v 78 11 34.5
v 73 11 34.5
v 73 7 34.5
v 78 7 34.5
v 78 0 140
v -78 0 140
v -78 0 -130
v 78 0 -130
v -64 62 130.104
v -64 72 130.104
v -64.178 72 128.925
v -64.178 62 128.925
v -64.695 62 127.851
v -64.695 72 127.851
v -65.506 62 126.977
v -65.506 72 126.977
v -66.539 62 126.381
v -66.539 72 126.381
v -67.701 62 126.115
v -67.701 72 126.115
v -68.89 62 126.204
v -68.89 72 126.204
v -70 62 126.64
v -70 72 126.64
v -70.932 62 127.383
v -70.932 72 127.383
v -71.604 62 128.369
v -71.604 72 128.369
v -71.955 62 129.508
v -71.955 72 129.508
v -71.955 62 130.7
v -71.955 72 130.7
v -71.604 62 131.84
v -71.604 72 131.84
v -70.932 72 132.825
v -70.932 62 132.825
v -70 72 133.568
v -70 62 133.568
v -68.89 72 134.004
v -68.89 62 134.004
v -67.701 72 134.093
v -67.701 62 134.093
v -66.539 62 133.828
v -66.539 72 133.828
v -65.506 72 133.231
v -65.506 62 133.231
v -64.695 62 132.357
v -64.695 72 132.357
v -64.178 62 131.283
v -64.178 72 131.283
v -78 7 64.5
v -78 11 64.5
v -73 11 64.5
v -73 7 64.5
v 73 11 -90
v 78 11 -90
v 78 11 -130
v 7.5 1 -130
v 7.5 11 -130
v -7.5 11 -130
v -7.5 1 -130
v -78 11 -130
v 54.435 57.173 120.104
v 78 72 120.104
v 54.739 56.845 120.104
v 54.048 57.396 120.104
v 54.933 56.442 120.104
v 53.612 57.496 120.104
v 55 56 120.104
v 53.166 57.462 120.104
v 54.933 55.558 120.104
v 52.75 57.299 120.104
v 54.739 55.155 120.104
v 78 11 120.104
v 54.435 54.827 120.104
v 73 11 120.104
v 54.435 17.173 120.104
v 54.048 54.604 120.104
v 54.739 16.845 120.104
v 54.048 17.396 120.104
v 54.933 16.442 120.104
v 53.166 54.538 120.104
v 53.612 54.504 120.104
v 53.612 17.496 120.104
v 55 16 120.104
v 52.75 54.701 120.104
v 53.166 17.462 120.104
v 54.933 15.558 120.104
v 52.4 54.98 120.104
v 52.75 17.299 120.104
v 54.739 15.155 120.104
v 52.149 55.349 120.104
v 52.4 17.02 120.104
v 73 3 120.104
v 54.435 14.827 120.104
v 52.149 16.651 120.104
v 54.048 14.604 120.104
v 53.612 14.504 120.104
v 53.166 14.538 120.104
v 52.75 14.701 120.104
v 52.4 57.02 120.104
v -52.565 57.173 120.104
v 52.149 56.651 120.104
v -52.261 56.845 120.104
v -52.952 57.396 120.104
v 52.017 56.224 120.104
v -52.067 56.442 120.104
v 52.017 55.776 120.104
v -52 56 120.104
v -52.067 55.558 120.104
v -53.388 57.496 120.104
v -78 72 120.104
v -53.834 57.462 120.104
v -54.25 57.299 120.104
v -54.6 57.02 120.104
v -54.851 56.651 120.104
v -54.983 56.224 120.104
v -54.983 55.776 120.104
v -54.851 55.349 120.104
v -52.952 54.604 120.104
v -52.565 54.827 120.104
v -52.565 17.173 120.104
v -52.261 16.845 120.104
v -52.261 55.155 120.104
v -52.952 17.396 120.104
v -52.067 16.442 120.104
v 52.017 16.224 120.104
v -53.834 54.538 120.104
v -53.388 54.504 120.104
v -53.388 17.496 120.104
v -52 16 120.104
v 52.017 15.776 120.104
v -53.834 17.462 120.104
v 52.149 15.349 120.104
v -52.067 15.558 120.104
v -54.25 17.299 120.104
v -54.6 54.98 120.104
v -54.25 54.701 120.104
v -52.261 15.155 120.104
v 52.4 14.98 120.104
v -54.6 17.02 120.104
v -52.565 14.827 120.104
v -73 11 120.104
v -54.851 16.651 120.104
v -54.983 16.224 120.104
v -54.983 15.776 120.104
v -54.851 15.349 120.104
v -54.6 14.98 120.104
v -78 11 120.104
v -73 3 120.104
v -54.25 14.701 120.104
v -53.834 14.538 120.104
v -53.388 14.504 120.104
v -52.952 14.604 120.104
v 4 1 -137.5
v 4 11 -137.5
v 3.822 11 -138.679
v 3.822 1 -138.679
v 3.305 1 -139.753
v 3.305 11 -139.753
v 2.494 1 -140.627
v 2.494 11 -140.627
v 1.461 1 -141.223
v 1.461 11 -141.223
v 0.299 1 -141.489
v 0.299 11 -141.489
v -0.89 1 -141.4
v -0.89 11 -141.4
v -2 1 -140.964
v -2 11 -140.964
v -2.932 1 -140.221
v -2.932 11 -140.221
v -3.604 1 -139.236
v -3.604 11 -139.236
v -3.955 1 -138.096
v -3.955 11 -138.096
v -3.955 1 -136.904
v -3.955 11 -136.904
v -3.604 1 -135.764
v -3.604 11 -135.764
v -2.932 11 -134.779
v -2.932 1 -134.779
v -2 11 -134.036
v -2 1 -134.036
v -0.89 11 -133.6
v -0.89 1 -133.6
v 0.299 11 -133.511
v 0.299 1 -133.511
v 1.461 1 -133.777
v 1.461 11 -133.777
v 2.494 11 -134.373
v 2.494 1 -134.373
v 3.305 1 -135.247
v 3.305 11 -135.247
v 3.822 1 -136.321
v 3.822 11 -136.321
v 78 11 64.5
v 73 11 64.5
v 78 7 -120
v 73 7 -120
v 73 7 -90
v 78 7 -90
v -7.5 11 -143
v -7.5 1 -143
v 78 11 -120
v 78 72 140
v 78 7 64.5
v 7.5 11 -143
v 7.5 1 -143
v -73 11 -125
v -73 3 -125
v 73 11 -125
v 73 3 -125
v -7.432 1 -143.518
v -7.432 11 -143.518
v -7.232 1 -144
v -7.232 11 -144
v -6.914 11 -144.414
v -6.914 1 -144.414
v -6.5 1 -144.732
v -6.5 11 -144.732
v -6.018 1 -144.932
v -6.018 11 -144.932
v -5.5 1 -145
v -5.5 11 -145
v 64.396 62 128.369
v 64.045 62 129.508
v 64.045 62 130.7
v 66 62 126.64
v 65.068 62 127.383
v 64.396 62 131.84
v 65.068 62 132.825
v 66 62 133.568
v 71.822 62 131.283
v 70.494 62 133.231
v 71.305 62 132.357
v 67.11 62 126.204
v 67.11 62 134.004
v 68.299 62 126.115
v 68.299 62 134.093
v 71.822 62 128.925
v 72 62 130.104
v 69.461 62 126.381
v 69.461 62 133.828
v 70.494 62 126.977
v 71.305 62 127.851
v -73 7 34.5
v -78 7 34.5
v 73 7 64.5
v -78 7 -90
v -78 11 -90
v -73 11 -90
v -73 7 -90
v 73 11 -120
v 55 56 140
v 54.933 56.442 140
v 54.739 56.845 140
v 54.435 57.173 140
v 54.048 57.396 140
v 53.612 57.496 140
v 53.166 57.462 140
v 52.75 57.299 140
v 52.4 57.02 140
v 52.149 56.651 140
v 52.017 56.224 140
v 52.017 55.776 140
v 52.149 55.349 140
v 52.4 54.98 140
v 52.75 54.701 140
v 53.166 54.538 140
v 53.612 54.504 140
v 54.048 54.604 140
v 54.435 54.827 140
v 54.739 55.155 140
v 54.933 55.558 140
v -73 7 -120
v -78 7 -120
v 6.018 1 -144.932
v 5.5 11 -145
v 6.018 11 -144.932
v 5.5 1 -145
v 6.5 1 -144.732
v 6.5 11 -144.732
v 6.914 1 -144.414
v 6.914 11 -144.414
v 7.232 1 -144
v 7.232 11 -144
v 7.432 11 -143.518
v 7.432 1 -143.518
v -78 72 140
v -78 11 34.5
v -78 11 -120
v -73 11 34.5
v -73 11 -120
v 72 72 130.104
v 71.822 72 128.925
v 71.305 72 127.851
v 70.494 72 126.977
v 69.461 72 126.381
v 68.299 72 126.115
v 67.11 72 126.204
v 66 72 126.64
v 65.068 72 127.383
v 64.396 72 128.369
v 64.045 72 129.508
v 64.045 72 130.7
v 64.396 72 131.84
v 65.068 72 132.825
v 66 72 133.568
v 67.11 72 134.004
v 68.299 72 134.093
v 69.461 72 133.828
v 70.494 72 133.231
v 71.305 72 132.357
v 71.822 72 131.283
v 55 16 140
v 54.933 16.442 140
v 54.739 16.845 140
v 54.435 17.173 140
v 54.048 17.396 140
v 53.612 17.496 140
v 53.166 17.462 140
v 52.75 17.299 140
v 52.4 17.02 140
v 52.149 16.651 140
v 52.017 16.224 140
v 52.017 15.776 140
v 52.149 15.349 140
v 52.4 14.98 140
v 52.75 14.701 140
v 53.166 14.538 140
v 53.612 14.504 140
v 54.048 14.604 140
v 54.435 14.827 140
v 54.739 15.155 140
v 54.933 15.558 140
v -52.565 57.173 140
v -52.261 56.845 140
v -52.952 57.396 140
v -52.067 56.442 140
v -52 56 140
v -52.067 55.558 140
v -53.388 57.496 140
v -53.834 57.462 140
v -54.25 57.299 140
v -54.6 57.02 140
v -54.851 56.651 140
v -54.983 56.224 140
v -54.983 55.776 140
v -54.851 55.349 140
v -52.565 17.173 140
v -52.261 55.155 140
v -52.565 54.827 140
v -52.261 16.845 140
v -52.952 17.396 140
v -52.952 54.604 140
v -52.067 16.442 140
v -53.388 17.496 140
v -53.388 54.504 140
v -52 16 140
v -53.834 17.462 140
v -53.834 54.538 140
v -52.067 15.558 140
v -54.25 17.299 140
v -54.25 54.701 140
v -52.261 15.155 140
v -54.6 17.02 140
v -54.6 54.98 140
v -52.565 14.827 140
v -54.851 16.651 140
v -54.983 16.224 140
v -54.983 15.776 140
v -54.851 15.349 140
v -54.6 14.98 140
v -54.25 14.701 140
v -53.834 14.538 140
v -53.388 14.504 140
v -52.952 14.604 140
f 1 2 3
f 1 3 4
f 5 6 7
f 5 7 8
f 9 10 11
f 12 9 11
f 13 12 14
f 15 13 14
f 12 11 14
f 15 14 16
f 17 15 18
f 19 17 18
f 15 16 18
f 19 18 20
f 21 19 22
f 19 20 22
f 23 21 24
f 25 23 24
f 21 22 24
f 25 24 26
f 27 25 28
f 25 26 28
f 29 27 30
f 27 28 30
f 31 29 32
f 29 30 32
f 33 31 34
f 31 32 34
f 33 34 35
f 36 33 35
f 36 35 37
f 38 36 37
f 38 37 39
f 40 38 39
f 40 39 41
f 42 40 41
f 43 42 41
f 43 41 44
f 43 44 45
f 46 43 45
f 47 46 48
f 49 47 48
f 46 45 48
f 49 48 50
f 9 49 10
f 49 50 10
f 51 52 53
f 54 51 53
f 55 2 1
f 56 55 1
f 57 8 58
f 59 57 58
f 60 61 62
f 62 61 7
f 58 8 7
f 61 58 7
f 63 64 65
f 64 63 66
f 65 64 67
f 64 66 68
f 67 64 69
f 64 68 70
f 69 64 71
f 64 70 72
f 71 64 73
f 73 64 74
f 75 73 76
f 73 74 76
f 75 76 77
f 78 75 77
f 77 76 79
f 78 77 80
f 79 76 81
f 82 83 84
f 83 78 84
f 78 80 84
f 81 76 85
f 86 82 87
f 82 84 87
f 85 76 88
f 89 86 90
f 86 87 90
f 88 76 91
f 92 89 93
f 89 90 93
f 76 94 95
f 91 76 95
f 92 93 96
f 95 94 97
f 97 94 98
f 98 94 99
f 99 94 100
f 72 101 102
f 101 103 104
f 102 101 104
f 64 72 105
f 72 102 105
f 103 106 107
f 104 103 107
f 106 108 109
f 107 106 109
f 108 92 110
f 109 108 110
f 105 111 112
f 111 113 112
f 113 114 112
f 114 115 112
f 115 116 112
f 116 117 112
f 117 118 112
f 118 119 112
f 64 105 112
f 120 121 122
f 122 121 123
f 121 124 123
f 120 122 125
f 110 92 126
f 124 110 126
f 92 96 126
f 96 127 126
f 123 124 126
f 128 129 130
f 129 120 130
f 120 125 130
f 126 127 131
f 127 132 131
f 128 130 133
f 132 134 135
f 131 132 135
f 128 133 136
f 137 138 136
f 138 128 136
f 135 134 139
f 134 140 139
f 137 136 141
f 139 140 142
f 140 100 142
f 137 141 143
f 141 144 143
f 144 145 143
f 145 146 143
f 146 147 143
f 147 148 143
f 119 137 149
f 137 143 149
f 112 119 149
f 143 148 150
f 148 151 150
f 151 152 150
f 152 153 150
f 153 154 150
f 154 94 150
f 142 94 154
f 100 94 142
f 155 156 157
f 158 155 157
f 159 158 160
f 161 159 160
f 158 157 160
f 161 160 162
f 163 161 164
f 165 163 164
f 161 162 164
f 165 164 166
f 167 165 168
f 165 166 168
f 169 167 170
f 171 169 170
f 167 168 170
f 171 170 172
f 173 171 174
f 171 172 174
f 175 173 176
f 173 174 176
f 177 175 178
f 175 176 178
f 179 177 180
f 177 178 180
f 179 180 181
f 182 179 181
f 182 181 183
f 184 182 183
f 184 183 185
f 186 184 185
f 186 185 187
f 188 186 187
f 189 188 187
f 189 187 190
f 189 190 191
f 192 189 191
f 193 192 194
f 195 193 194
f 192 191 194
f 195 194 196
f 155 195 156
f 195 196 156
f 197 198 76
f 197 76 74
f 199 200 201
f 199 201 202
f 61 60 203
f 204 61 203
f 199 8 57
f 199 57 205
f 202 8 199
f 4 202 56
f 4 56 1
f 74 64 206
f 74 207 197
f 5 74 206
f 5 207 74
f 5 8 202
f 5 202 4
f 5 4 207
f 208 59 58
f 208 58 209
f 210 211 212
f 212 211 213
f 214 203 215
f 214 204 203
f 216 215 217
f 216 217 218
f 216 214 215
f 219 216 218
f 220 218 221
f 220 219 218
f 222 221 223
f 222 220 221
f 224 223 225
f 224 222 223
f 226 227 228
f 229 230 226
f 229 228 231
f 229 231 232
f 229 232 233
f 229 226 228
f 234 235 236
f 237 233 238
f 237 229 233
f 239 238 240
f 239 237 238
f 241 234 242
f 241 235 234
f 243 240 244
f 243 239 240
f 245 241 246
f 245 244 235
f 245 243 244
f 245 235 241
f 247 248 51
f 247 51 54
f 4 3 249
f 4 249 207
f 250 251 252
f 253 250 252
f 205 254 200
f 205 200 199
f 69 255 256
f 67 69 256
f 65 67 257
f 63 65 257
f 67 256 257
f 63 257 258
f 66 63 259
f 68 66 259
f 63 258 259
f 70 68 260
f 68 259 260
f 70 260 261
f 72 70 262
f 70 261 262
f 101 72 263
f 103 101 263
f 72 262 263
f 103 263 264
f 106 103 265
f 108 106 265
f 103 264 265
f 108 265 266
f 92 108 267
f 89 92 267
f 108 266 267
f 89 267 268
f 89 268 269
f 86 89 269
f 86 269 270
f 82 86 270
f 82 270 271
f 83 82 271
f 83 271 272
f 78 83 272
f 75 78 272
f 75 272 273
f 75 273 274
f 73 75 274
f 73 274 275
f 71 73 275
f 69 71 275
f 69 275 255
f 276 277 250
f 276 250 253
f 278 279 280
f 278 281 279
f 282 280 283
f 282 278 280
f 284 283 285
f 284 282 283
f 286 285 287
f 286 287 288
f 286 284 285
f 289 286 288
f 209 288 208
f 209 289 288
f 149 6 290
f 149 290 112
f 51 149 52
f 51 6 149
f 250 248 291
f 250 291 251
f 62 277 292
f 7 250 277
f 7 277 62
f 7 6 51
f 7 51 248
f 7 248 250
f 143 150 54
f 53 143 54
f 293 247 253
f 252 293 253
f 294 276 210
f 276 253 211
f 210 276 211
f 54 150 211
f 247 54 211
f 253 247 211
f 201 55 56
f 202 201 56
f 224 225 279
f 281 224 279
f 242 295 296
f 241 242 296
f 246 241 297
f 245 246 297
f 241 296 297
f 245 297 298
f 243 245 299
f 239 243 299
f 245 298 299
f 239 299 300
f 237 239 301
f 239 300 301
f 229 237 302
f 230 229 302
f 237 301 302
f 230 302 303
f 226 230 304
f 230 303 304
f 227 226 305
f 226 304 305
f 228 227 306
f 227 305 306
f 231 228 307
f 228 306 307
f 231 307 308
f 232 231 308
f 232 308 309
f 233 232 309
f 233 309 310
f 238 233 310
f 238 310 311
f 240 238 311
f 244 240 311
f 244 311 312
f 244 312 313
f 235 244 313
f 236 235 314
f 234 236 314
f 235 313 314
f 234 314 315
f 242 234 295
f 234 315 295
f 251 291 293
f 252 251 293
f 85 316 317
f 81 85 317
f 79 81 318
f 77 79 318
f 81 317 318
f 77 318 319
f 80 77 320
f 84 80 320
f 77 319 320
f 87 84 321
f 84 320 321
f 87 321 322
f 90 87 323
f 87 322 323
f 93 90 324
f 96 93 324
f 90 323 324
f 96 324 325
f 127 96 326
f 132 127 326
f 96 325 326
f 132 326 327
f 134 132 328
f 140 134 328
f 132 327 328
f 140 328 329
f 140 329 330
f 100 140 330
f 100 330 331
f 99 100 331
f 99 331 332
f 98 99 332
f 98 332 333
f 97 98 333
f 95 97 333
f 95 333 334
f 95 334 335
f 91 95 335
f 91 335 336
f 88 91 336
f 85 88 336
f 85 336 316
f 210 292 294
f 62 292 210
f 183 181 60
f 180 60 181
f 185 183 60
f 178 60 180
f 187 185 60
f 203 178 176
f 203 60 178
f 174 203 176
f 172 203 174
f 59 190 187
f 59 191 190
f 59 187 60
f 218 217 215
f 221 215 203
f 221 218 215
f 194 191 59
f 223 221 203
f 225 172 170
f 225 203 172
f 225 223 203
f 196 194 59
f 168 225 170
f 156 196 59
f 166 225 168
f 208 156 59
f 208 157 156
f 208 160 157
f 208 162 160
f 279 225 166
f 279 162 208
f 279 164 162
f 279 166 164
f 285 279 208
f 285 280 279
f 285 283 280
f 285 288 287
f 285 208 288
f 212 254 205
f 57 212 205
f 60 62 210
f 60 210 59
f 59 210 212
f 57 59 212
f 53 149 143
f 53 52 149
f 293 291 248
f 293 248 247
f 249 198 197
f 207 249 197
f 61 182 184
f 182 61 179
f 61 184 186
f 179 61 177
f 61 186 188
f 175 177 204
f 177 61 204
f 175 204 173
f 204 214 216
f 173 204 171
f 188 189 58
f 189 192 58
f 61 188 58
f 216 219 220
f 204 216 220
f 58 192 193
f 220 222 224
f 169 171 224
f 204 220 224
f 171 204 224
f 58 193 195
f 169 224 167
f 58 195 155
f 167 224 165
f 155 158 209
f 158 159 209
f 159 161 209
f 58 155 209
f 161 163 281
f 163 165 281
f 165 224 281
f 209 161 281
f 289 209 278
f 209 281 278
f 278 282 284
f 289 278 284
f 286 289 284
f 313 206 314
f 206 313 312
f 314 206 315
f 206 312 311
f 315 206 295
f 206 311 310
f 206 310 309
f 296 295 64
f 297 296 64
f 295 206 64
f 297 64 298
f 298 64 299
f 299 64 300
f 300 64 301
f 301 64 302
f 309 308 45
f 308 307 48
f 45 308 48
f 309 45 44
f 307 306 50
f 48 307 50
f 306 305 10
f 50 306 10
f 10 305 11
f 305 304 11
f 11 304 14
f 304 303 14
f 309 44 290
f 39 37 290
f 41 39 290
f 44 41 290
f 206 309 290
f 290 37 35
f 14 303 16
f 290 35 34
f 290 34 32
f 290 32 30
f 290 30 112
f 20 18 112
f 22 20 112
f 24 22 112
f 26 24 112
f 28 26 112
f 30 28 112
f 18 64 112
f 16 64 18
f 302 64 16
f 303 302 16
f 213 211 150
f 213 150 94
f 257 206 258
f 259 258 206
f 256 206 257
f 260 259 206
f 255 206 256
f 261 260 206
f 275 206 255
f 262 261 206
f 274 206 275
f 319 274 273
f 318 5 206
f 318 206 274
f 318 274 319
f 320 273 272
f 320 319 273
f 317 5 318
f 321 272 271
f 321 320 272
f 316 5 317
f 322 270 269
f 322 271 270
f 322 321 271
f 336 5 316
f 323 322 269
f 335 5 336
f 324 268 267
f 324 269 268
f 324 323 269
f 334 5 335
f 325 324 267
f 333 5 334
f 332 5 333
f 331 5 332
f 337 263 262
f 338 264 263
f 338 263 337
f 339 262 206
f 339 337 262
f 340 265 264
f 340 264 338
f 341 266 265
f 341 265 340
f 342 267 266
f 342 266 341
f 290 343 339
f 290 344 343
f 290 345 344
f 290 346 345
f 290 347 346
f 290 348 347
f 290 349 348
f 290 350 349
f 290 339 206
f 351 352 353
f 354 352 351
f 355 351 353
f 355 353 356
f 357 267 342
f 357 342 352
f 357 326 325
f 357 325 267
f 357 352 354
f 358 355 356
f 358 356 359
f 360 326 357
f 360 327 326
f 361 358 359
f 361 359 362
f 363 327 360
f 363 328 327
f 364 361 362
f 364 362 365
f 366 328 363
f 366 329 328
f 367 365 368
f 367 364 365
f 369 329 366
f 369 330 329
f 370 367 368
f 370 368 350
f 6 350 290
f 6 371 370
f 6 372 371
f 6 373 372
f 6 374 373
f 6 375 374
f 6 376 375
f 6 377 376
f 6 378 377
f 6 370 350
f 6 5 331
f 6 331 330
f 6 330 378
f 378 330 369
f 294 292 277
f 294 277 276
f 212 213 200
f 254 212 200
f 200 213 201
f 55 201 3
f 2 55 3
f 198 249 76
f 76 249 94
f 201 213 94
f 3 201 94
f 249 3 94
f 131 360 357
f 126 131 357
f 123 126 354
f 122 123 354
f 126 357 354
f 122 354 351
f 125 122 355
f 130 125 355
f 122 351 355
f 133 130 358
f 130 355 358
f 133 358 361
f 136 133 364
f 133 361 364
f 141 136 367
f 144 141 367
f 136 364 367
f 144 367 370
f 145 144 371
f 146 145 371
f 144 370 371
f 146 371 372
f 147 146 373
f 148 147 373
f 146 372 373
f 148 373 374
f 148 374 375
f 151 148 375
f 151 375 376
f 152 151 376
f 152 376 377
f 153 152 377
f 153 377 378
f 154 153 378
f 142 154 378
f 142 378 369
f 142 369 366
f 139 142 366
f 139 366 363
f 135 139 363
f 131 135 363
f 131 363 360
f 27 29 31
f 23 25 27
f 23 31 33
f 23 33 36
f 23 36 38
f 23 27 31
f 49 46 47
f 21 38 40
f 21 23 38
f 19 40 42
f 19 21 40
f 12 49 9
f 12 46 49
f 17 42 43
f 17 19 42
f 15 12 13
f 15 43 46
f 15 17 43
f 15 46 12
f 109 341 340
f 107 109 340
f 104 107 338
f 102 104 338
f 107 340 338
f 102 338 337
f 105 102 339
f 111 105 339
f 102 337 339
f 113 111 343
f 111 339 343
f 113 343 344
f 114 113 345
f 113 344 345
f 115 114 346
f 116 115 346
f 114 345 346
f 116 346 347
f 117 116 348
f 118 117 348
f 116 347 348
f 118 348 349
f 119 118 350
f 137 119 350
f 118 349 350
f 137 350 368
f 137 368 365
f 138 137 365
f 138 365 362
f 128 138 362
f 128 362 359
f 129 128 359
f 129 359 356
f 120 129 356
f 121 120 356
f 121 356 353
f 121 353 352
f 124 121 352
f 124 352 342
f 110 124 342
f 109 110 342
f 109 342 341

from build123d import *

# Parameters (mm, degrees)
BOSS_EXTRUDE1_DEPTH = 3
BOSS_EXTRUDE2_DEPTH = 8
BOSS_EXTRUDE3_DEPTH = 69
SKETCH4_R           = 4
CUT_EXTRUDE1_DEPTH  = 10
SKETCH5_W           = 5
SKETCH5_H           = 30
CUT_EXTRUDE2_DEPTH  = 4
SKETCH6_W           = 15
SKETCH6_H           = 15
BOSS_EXTRUDE4_DEPTH = 10
SKETCH7_R           = 4
CUT_EXTRUDE3_DEPTH  = 10
FILLET1_R           = 2
SKETCH8_R           = 1.5
CUT_EXTRUDE4_DEPTH  = 286


with BuildPart() as part:
    # Sketch1 → Boss-Extrude1 (new body)
    with BuildSketch(Plane(origin=(0, 0, 0), x_dir=(1, 0, 0), z_dir=(0, 1, 0))):
        Polygon((-78, -130), (-78, -140), (78, -140), (78, -130), (78, 130), (-78, 130), align=None)
    extrude(amount=BOSS_EXTRUDE1_DEPTH)

    # Sketch2 → Boss-Extrude2 (add)
    with BuildSketch(Plane(origin=(0, 3, 0), x_dir=(1, 0, 0), z_dir=(0, 1, 0))):
        Polygon((-73, -120.104101991), (-73, 125), (73, 125), (73, -120.104101991), (78, -120.104101991), (78, 130), (-78, 130), (-78, -120.104101991), align=None)
    extrude(amount=BOSS_EXTRUDE2_DEPTH)

    # Sketch3 → Boss-Extrude3 (add)
    with BuildSketch(Plane(origin=(0, 3, 0), x_dir=(1, 0, 0), z_dir=(0, 1, 0))):
        Polygon((73, -120.104101991), (78, -120.104101991), (78, -140), (-78, -140), (-78, -120.104101991), (-73, -120.104101991), align=None)
    extrude(amount=BOSS_EXTRUDE3_DEPTH)

    # Sketch4 → Cut-Extrude1 (cut)
    with BuildSketch(Plane(origin=(0, 72, 0), x_dir=(1, 0, 0), z_dir=(0, 1, 0))):
        with Locations((-68, -130.104101991)):
            Circle(SKETCH4_R)
        with Locations((68, -130.104101991)):
            Circle(SKETCH4_R)
    extrude(amount=-CUT_EXTRUDE1_DEPTH, mode=Mode.SUBTRACT)

    # Sketch5 → Cut-Extrude2 (cut)
    with BuildSketch(Plane(origin=(0, 11, 0), x_dir=(1, 0, 0), z_dir=(0, 1, 0))):
        with Locations((-75.5, 105)):
            Rectangle(SKETCH5_W, SKETCH5_H)
        with Locations((-75.5, -49.5)):
            Rectangle(SKETCH5_W, SKETCH5_H)
        with Locations((75.5, -49.5)):
            Rectangle(SKETCH5_W, SKETCH5_H)
        with Locations((75.5, 105)):
            Rectangle(SKETCH5_W, SKETCH5_H)
    extrude(amount=-CUT_EXTRUDE2_DEPTH, mode=Mode.SUBTRACT)

    # Sketch6 → Boss-Extrude4 (add)
    with BuildSketch(Plane(origin=(0, 11, 0), x_dir=(1, 0, 0), z_dir=(0, 1, 0))):
        with Locations((0, 137.5)):
            Rectangle(SKETCH6_W, SKETCH6_H)
    extrude(amount=-BOSS_EXTRUDE4_DEPTH)

    # Sketch7 → Cut-Extrude3 (cut)
    with BuildSketch(Plane(origin=(0, 11, 0), x_dir=(1, 0, 0), z_dir=(0, 1, 0))):
        with Locations((0, 137.5)):
            Circle(SKETCH7_R)
    extrude(amount=-CUT_EXTRUDE3_DEPTH, mode=Mode.SUBTRACT)

    # Fillet1
    fillet1_edges = [part.edges().sort_by_distance(p)[0] for p in [
        (7.5, 6, -145),
        (-7.5, 6, -145),
    ]]
    fillet(fillet1_edges, radius=FILLET1_R)

    # Sketch8 → Cut-Extrude4 (cut, through all)
    with BuildSketch(Plane.XY.offset(140)):
        with Locations((53.5, 56)):
            Circle(SKETCH8_R)
        with Locations((53.5, 16)):
            Circle(SKETCH8_R)
        with Locations((-53.5, 16)):
            Circle(SKETCH8_R)
        with Locations((-53.5, 56)):
            Circle(SKETCH8_R)
    extrude(amount=-CUT_EXTRUDE4_DEPTH, mode=Mode.SUBTRACT)


solid = part.part
